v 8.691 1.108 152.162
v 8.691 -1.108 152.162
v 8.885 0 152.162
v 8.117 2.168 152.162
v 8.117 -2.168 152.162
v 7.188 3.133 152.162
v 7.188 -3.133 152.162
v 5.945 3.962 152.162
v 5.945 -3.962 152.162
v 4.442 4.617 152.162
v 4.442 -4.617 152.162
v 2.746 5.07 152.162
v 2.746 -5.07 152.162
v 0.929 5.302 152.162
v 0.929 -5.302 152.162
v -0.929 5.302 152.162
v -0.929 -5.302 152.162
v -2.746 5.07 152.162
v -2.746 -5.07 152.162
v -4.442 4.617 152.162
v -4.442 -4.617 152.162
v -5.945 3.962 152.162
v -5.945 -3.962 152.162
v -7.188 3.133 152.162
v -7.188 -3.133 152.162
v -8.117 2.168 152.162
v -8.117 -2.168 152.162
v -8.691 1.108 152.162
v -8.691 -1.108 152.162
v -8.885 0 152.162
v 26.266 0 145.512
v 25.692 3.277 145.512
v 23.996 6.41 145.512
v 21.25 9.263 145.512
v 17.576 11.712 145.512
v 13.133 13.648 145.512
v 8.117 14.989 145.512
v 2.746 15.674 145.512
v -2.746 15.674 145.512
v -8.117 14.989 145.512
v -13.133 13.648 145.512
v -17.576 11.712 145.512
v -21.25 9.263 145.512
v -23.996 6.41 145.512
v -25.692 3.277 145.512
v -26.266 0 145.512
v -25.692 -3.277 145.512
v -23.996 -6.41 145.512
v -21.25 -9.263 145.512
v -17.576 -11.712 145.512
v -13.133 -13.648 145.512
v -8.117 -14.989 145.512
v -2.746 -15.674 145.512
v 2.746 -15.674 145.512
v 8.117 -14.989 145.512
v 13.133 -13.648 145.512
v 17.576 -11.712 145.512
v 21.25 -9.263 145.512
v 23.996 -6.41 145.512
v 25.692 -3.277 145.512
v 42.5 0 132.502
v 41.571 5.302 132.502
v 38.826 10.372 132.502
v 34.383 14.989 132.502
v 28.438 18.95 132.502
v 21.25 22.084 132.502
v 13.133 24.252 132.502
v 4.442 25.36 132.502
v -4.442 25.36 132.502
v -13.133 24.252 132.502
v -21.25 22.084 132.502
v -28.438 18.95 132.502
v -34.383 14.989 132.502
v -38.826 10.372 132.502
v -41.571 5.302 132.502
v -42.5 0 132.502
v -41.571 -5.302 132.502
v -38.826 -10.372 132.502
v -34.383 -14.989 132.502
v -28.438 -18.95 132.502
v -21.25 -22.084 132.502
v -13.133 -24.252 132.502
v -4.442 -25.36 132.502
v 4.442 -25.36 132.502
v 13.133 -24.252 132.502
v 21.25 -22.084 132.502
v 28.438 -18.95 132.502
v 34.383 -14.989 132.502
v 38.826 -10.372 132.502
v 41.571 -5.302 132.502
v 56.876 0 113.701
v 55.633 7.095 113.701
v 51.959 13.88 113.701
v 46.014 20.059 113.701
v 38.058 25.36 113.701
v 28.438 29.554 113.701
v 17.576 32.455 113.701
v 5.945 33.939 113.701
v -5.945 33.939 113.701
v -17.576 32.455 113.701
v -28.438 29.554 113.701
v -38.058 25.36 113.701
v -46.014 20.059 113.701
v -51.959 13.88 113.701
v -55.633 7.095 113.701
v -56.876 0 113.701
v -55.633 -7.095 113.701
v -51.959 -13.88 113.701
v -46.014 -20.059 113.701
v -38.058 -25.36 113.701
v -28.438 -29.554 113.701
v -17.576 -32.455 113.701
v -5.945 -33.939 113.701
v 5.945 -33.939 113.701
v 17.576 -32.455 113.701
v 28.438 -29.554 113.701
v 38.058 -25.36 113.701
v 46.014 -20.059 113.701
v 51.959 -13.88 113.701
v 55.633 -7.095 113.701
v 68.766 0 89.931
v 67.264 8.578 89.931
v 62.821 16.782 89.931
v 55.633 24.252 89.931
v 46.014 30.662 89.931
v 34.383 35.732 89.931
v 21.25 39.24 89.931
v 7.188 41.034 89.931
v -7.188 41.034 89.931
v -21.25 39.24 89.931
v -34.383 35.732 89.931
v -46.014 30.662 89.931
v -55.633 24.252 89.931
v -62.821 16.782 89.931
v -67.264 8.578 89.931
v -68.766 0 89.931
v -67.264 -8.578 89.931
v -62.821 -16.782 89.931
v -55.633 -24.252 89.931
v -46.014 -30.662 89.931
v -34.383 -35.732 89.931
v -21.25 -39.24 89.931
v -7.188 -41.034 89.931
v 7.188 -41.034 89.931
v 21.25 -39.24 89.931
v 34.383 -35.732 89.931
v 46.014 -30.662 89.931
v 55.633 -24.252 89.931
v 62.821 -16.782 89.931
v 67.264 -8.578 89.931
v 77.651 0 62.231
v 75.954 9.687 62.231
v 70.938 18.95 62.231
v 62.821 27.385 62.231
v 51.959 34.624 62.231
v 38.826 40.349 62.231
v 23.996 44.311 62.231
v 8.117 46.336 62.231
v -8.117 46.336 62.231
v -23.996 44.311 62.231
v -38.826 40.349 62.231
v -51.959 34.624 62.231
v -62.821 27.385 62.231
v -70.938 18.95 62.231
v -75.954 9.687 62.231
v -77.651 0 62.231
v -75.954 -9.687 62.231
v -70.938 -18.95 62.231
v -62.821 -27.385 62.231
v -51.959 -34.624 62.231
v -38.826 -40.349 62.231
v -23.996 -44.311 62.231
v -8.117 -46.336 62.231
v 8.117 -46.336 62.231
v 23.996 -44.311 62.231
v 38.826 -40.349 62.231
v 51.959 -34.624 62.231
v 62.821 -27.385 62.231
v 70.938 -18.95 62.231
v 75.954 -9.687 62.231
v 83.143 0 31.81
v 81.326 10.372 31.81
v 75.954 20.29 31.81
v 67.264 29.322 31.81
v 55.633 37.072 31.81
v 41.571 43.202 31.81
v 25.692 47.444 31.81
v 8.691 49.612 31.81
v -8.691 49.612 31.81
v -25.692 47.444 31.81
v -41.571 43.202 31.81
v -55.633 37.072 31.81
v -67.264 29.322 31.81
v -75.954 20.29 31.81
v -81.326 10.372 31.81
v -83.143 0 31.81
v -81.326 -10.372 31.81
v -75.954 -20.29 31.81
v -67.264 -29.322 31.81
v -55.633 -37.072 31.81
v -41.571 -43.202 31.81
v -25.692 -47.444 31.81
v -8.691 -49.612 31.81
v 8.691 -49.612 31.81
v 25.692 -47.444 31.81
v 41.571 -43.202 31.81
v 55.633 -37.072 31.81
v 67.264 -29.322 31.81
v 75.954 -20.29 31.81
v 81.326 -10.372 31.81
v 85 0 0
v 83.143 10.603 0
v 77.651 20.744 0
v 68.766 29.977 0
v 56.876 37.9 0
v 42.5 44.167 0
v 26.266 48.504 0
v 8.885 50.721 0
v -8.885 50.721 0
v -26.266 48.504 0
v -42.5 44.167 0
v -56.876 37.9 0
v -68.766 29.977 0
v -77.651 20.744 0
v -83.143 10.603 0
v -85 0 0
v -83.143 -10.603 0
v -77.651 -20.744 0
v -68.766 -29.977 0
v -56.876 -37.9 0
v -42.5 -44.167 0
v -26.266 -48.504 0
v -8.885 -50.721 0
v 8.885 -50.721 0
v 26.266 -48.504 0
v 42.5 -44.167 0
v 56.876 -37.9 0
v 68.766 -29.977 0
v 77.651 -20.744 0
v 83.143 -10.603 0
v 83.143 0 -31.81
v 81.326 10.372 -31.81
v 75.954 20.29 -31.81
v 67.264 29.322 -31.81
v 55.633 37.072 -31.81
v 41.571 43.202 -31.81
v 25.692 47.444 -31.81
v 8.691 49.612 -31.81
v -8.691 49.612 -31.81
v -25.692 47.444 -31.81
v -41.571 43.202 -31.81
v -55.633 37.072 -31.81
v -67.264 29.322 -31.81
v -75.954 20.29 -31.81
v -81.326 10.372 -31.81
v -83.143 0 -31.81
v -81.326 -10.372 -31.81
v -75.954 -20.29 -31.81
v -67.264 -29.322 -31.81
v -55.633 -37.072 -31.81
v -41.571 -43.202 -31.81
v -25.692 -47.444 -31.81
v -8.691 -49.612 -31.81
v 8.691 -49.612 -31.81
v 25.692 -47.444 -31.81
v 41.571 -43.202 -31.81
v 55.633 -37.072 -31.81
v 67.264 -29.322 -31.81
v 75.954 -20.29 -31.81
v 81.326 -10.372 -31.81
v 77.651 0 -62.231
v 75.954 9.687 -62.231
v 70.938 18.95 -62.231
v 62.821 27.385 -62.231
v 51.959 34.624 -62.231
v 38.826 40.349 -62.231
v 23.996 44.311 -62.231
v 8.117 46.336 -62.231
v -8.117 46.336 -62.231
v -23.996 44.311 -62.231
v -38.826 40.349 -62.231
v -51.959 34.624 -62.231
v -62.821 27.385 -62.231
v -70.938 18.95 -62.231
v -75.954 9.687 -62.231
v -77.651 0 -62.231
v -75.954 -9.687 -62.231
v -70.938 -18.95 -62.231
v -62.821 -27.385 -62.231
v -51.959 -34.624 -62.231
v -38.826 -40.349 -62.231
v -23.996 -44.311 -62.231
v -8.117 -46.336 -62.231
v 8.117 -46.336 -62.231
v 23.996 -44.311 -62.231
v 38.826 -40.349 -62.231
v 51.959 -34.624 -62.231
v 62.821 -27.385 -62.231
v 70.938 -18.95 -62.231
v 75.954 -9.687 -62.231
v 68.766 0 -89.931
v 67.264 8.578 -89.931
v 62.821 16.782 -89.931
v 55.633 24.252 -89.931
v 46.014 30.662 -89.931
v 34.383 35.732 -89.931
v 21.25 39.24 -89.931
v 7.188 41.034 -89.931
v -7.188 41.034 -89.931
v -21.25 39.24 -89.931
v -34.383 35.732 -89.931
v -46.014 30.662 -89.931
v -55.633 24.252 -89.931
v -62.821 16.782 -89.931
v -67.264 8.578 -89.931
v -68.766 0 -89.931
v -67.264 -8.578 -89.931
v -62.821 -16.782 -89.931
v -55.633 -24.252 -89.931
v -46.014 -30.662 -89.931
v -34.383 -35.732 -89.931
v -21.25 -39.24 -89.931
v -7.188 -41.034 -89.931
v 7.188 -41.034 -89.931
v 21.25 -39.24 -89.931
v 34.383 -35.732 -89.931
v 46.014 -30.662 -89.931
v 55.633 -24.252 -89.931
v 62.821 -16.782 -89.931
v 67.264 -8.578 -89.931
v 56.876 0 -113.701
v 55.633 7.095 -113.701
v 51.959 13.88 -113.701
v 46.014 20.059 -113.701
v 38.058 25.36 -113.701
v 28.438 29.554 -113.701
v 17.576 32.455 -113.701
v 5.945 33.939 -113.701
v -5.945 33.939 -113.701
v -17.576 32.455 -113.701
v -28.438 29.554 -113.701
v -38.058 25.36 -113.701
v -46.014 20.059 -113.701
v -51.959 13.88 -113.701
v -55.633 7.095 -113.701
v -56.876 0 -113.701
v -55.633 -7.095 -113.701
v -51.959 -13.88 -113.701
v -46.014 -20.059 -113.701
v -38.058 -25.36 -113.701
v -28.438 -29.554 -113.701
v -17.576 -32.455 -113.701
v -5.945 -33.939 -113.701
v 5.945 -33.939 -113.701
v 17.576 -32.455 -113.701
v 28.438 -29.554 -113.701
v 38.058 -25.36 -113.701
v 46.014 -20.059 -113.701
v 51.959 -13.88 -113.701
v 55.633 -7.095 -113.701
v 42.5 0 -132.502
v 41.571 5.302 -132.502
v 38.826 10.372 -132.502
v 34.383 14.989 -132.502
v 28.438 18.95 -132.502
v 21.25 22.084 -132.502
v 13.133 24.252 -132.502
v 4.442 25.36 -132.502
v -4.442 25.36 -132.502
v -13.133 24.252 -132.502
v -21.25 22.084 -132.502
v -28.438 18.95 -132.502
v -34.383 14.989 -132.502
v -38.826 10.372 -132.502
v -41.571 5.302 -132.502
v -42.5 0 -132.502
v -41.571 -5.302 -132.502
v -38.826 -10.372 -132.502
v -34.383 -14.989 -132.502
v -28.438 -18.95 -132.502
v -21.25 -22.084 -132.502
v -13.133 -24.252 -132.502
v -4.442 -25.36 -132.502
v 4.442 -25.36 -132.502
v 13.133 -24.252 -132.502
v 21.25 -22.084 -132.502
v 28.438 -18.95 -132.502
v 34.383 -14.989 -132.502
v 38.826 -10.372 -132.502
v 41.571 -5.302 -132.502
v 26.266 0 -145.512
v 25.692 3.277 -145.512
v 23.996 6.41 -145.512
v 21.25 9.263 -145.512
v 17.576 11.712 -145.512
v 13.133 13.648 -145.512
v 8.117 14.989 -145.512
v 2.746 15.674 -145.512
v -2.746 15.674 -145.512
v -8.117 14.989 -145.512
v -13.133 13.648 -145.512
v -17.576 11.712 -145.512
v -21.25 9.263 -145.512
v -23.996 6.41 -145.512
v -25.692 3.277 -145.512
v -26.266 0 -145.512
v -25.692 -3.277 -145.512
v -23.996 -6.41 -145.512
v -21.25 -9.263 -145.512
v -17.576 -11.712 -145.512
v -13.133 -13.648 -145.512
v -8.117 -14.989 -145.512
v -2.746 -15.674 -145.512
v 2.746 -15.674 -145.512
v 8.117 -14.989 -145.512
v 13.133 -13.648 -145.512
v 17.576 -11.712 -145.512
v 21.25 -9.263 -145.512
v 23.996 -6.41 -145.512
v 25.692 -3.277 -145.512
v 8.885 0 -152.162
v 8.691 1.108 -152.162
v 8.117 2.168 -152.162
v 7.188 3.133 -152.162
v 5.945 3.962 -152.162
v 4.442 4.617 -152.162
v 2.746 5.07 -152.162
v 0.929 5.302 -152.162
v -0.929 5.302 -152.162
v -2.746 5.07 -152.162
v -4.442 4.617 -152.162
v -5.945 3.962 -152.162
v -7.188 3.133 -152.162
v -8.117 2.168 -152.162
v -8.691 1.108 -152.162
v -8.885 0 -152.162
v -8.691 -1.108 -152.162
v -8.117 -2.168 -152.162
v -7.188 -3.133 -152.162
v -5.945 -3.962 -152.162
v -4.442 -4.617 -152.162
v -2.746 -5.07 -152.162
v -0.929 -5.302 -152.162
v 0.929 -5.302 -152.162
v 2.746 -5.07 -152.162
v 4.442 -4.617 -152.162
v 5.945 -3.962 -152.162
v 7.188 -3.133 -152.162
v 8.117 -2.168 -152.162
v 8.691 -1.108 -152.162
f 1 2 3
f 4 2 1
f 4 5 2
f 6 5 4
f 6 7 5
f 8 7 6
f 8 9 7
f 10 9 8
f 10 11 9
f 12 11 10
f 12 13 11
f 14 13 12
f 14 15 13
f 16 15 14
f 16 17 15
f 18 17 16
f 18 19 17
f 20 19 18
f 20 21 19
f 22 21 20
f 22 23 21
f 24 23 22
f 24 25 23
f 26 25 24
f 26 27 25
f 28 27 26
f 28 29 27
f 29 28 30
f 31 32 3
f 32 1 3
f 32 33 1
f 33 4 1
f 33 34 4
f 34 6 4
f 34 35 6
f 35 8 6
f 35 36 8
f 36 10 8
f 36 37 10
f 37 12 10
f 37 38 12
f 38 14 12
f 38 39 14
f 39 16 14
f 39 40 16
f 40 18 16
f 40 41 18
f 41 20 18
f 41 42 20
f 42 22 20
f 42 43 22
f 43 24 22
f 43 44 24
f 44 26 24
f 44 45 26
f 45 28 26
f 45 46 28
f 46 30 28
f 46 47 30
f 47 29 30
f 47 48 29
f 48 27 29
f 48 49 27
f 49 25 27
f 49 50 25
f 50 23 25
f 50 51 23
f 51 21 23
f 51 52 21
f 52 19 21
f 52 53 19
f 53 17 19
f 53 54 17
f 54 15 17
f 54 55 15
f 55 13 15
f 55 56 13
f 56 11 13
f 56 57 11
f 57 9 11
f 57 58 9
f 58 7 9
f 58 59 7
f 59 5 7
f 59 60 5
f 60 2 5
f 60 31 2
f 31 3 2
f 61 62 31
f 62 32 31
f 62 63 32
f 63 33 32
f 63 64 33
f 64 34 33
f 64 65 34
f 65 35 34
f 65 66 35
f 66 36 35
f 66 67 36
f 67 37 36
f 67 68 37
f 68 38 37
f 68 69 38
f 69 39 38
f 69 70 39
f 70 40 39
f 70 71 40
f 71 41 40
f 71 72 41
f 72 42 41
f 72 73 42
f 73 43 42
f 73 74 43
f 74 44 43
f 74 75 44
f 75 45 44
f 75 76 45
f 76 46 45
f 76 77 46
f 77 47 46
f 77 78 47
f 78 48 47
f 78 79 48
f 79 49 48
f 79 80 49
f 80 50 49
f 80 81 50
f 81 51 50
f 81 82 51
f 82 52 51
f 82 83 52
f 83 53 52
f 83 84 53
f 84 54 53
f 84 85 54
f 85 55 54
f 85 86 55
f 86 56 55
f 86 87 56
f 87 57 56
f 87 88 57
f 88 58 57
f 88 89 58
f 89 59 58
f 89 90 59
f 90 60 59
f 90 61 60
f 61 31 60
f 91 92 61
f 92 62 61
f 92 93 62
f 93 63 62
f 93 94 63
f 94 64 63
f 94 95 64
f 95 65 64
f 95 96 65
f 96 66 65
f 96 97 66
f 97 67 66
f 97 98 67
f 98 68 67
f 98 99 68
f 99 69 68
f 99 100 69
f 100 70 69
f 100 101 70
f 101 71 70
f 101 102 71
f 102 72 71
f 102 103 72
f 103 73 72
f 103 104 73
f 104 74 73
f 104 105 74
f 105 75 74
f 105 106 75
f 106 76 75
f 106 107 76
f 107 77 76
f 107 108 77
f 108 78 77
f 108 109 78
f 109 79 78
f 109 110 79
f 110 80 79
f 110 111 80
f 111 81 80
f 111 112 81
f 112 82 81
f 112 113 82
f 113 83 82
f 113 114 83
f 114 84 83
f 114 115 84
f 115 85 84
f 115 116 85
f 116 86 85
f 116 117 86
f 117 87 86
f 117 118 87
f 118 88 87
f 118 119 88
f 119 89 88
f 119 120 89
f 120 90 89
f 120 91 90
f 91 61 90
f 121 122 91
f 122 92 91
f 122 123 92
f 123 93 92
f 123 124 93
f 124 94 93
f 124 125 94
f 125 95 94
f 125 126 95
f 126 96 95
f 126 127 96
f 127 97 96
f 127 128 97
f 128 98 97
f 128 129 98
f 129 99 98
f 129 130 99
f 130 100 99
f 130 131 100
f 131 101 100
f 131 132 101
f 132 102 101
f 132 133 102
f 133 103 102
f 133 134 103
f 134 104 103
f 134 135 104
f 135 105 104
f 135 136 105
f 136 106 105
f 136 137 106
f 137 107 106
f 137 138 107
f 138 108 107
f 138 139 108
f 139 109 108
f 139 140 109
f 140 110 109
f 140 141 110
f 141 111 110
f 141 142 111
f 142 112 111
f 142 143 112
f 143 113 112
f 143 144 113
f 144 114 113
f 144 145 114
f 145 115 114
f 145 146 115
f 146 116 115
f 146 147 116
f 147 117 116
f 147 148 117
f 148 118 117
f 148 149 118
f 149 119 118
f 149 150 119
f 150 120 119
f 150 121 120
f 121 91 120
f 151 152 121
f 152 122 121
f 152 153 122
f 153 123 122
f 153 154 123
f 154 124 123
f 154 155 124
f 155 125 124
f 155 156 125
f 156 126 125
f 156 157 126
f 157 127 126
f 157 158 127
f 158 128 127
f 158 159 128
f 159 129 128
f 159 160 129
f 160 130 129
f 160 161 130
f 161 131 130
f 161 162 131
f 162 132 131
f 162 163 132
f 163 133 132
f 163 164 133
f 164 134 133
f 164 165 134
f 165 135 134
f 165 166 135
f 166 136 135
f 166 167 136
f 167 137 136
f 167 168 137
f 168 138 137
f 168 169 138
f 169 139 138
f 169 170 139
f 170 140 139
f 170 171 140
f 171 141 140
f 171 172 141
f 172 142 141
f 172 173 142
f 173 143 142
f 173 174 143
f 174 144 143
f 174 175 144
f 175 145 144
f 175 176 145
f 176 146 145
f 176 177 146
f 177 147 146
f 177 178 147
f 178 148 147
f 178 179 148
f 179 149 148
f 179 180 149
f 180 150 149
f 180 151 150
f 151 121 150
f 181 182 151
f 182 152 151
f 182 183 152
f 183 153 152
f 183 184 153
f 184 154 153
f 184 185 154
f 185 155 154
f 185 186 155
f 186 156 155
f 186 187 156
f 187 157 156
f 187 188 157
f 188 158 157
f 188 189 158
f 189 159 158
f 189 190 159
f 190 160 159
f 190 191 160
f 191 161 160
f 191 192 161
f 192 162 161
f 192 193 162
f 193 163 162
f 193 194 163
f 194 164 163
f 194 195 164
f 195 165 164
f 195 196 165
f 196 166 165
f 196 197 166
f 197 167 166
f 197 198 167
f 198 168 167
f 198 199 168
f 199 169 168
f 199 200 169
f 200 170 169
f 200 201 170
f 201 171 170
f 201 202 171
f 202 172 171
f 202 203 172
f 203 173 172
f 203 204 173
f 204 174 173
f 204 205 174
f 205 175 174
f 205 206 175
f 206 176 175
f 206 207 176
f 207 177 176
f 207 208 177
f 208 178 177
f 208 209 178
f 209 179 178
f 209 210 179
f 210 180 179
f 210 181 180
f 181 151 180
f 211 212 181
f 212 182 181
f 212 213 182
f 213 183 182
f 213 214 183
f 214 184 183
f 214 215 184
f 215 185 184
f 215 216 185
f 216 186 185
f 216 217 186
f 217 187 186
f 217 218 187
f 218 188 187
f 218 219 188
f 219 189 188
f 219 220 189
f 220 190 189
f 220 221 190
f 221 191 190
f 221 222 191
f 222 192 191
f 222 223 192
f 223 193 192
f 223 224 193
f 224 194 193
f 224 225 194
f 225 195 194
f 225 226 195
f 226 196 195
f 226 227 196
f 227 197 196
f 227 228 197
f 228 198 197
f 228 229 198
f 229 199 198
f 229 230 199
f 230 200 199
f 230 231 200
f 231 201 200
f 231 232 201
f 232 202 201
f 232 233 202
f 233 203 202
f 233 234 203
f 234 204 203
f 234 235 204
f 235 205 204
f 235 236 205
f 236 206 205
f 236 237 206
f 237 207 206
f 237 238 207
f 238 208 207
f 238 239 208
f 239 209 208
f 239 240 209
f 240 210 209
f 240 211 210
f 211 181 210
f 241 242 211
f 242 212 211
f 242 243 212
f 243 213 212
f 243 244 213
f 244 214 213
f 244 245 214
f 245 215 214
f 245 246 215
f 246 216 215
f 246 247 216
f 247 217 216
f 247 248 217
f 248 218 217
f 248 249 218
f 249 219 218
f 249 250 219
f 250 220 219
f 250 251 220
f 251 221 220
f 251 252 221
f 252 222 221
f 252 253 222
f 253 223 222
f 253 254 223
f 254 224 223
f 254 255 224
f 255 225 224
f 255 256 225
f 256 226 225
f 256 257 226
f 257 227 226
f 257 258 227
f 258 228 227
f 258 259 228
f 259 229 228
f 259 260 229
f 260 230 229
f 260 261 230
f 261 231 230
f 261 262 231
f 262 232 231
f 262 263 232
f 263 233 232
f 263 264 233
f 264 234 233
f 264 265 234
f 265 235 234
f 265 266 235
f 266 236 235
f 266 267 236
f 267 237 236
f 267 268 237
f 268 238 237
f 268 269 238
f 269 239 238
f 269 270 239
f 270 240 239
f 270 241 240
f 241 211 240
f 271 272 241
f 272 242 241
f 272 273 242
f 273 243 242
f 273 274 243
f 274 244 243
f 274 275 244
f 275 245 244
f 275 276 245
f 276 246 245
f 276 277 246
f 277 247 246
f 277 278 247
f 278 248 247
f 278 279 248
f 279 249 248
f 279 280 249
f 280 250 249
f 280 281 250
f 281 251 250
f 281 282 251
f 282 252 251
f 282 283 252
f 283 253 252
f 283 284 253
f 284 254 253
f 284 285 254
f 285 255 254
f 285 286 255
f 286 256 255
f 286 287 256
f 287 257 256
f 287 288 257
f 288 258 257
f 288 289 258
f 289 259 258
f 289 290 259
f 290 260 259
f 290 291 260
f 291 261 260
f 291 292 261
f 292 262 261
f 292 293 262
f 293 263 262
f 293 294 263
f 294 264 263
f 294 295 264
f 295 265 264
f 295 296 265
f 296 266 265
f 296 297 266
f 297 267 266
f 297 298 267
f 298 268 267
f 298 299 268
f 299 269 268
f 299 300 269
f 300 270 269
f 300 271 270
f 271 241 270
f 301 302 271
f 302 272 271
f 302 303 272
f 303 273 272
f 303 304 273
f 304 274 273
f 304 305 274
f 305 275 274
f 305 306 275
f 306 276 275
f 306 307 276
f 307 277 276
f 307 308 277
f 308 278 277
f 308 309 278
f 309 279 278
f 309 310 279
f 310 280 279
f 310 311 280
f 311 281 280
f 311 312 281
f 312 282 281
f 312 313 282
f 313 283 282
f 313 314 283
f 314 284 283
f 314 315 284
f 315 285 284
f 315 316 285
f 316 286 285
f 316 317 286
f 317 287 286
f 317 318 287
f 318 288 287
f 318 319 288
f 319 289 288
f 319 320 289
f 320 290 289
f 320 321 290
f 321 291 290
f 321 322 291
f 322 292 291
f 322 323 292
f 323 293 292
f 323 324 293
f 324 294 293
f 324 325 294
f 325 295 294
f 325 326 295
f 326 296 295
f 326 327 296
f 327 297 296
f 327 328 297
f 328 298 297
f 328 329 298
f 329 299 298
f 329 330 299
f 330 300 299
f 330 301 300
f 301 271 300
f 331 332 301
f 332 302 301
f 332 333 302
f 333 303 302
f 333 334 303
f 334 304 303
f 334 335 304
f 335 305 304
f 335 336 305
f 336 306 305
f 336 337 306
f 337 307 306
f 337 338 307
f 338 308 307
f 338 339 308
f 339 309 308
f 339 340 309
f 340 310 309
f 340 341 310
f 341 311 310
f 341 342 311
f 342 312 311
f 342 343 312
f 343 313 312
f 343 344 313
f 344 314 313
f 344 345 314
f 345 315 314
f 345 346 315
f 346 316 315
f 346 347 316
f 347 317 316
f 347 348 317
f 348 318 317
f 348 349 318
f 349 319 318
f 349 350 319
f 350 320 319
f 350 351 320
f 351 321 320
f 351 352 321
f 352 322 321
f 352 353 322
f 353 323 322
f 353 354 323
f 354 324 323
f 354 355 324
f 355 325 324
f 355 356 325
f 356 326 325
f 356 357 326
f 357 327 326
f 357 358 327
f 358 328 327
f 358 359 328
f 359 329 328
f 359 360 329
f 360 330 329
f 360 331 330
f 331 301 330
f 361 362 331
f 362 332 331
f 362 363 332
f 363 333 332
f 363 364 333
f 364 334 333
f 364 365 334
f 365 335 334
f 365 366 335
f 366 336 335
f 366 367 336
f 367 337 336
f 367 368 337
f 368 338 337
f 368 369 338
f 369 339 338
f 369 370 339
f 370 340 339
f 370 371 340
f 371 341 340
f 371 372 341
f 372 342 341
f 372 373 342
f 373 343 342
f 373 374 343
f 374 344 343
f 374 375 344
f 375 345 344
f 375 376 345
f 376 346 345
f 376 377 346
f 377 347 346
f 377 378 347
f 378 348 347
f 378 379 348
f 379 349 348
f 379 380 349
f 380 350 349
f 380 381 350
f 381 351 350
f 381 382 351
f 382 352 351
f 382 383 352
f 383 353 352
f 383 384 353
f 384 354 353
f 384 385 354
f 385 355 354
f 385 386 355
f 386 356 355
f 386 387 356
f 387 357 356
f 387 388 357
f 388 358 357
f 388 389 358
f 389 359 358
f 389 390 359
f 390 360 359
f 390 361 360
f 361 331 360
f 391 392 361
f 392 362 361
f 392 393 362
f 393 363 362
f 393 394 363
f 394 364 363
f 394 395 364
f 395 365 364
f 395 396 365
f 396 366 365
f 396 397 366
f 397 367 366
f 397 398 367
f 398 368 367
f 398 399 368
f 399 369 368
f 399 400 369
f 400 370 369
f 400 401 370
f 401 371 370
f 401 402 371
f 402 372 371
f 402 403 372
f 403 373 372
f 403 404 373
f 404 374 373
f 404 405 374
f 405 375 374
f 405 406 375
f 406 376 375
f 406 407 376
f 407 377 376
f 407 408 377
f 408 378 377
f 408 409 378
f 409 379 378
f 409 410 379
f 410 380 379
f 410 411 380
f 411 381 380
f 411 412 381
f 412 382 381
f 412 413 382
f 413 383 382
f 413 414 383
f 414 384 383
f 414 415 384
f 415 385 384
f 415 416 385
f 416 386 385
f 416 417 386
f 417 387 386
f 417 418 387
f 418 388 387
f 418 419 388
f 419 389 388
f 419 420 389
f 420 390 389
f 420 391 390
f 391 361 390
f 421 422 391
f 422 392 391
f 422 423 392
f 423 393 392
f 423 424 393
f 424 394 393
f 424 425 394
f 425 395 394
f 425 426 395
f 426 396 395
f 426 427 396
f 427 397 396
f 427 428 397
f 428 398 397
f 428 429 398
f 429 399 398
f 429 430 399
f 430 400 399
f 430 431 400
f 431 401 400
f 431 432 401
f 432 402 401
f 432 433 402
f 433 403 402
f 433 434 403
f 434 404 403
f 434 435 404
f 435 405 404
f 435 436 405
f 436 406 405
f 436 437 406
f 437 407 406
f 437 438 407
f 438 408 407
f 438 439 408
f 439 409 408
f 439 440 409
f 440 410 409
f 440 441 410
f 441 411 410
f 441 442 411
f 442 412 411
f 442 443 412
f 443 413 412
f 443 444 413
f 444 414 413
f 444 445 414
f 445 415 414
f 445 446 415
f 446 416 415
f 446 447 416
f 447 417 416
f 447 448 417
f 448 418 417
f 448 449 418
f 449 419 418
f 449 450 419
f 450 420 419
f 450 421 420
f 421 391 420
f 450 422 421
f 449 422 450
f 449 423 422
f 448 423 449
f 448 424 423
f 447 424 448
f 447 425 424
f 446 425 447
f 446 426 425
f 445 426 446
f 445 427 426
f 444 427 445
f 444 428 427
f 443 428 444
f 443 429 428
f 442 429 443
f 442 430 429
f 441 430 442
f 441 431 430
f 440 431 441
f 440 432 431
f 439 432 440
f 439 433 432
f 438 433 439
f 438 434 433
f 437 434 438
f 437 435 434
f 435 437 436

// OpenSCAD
// Generated by SolidPython 1.0.1 on 2020-07-29 00:46:46


scale(v = [5, 3, 9]) {
	sphere(r = 17);
}
/***********************************************
*********      SolidPython code:      **********
************************************************
 
# import packages: SolidPython
from solid import *
from solid.utils import *
from itertools import chain, combinations, permutations


class Resize:

    def __init__(self, scad_file):
        self.scad_file = scad_file
        #self.scad_file = import_scad(scad_file)
        # cone/cylinder param:
        self.r1 = 0
        self.r2 = 0
        self.h = 0
        # rectangular prism param:
        self.w = 0
        self.l = 0
        # ellipse param:
        self.r = 0

    # import OpenScad code (file name corresponds to shape)


    # classify shape + parameters
    def assign(self, param1, param2, param3):
        if self.scad_file == 'cone.scad':
            self.r1 = param1
            self.r2 = param2
            self.h = param3
        elif self.scad_file == 'cylinder.scad':
            self.r1 = param1
            self.r2 = param2
            self.h = param3
        elif self.scad_file == 'rectangularPrism.scad':
            self.h = param1
            self.l = param2
            self.w = param3
        else:
            self.r = param1
            self.h = param2

    # resize parameters
    def iterate(self):
        x = range(3, 20, 2)
        i = 1
        if self.scad_file == 'cone.scad':
            tempList = list(permutations(x, 2))
            for temp in tempList:
                param1 = temp[0]
                param2 = temp[1]
                filepath = 'produced_scad_files/' + 'cone' + str(param1) + '_' + str(param2) + '_' + '.scad'
                scad_render_to_file(cylinder(h=param1, r1=param2, r2=0), filepath)

        elif self.scad_file == 'cylinder.scad':
            tempList = list(permutations(x, 3))
            for temp in tempList:
                param1 = temp[0]
                param2 = temp[1]
                filepath = 'produced_scad_files/' + 'cylinder' + str(param1) + '_' + str(param2) + '_' + '.scad'
                scad_render_to_file(cylinder(h=param1, r1=param2, r2=param2), filepath)

        elif self.scad_file == 'rectangularPrism.scad':
            tempList = list(permutations(x, 3))
            for temp in tempList:
                param1 = temp[0]
                param2 = temp[1]
                param3 = temp[2]
                filepath = 'produced_scad_files/' + 'rectangularPrism' + str(param1) + '_' + str(param2) + '_' + str(
                    param3) + '.scad'
                scad_render_to_file(cube(size=(param1, param2, param3)), filepath)

        elif self.scad_file == 'ellipse.scad':
            tempList = list(permutations(x, 4))
            for temp in tempList:
                param1 = temp[0]
                param2 = temp[1]
                param3 = temp[2]
                param4 = temp[3]
                filepath = 'produced_scad_files/' + 'ellipse' + str(param1) + '_' + str(param2) + '_' + str(param3) + '_' + str(param4) + '.scad'
                scad_render_to_file(scale([param1, param2, param3])(sphere(r=param4)), filepath)

    def render_to_scadfile(self):
        scad_render_to_file(scad, 'example.scad') 
 
************************************************/
